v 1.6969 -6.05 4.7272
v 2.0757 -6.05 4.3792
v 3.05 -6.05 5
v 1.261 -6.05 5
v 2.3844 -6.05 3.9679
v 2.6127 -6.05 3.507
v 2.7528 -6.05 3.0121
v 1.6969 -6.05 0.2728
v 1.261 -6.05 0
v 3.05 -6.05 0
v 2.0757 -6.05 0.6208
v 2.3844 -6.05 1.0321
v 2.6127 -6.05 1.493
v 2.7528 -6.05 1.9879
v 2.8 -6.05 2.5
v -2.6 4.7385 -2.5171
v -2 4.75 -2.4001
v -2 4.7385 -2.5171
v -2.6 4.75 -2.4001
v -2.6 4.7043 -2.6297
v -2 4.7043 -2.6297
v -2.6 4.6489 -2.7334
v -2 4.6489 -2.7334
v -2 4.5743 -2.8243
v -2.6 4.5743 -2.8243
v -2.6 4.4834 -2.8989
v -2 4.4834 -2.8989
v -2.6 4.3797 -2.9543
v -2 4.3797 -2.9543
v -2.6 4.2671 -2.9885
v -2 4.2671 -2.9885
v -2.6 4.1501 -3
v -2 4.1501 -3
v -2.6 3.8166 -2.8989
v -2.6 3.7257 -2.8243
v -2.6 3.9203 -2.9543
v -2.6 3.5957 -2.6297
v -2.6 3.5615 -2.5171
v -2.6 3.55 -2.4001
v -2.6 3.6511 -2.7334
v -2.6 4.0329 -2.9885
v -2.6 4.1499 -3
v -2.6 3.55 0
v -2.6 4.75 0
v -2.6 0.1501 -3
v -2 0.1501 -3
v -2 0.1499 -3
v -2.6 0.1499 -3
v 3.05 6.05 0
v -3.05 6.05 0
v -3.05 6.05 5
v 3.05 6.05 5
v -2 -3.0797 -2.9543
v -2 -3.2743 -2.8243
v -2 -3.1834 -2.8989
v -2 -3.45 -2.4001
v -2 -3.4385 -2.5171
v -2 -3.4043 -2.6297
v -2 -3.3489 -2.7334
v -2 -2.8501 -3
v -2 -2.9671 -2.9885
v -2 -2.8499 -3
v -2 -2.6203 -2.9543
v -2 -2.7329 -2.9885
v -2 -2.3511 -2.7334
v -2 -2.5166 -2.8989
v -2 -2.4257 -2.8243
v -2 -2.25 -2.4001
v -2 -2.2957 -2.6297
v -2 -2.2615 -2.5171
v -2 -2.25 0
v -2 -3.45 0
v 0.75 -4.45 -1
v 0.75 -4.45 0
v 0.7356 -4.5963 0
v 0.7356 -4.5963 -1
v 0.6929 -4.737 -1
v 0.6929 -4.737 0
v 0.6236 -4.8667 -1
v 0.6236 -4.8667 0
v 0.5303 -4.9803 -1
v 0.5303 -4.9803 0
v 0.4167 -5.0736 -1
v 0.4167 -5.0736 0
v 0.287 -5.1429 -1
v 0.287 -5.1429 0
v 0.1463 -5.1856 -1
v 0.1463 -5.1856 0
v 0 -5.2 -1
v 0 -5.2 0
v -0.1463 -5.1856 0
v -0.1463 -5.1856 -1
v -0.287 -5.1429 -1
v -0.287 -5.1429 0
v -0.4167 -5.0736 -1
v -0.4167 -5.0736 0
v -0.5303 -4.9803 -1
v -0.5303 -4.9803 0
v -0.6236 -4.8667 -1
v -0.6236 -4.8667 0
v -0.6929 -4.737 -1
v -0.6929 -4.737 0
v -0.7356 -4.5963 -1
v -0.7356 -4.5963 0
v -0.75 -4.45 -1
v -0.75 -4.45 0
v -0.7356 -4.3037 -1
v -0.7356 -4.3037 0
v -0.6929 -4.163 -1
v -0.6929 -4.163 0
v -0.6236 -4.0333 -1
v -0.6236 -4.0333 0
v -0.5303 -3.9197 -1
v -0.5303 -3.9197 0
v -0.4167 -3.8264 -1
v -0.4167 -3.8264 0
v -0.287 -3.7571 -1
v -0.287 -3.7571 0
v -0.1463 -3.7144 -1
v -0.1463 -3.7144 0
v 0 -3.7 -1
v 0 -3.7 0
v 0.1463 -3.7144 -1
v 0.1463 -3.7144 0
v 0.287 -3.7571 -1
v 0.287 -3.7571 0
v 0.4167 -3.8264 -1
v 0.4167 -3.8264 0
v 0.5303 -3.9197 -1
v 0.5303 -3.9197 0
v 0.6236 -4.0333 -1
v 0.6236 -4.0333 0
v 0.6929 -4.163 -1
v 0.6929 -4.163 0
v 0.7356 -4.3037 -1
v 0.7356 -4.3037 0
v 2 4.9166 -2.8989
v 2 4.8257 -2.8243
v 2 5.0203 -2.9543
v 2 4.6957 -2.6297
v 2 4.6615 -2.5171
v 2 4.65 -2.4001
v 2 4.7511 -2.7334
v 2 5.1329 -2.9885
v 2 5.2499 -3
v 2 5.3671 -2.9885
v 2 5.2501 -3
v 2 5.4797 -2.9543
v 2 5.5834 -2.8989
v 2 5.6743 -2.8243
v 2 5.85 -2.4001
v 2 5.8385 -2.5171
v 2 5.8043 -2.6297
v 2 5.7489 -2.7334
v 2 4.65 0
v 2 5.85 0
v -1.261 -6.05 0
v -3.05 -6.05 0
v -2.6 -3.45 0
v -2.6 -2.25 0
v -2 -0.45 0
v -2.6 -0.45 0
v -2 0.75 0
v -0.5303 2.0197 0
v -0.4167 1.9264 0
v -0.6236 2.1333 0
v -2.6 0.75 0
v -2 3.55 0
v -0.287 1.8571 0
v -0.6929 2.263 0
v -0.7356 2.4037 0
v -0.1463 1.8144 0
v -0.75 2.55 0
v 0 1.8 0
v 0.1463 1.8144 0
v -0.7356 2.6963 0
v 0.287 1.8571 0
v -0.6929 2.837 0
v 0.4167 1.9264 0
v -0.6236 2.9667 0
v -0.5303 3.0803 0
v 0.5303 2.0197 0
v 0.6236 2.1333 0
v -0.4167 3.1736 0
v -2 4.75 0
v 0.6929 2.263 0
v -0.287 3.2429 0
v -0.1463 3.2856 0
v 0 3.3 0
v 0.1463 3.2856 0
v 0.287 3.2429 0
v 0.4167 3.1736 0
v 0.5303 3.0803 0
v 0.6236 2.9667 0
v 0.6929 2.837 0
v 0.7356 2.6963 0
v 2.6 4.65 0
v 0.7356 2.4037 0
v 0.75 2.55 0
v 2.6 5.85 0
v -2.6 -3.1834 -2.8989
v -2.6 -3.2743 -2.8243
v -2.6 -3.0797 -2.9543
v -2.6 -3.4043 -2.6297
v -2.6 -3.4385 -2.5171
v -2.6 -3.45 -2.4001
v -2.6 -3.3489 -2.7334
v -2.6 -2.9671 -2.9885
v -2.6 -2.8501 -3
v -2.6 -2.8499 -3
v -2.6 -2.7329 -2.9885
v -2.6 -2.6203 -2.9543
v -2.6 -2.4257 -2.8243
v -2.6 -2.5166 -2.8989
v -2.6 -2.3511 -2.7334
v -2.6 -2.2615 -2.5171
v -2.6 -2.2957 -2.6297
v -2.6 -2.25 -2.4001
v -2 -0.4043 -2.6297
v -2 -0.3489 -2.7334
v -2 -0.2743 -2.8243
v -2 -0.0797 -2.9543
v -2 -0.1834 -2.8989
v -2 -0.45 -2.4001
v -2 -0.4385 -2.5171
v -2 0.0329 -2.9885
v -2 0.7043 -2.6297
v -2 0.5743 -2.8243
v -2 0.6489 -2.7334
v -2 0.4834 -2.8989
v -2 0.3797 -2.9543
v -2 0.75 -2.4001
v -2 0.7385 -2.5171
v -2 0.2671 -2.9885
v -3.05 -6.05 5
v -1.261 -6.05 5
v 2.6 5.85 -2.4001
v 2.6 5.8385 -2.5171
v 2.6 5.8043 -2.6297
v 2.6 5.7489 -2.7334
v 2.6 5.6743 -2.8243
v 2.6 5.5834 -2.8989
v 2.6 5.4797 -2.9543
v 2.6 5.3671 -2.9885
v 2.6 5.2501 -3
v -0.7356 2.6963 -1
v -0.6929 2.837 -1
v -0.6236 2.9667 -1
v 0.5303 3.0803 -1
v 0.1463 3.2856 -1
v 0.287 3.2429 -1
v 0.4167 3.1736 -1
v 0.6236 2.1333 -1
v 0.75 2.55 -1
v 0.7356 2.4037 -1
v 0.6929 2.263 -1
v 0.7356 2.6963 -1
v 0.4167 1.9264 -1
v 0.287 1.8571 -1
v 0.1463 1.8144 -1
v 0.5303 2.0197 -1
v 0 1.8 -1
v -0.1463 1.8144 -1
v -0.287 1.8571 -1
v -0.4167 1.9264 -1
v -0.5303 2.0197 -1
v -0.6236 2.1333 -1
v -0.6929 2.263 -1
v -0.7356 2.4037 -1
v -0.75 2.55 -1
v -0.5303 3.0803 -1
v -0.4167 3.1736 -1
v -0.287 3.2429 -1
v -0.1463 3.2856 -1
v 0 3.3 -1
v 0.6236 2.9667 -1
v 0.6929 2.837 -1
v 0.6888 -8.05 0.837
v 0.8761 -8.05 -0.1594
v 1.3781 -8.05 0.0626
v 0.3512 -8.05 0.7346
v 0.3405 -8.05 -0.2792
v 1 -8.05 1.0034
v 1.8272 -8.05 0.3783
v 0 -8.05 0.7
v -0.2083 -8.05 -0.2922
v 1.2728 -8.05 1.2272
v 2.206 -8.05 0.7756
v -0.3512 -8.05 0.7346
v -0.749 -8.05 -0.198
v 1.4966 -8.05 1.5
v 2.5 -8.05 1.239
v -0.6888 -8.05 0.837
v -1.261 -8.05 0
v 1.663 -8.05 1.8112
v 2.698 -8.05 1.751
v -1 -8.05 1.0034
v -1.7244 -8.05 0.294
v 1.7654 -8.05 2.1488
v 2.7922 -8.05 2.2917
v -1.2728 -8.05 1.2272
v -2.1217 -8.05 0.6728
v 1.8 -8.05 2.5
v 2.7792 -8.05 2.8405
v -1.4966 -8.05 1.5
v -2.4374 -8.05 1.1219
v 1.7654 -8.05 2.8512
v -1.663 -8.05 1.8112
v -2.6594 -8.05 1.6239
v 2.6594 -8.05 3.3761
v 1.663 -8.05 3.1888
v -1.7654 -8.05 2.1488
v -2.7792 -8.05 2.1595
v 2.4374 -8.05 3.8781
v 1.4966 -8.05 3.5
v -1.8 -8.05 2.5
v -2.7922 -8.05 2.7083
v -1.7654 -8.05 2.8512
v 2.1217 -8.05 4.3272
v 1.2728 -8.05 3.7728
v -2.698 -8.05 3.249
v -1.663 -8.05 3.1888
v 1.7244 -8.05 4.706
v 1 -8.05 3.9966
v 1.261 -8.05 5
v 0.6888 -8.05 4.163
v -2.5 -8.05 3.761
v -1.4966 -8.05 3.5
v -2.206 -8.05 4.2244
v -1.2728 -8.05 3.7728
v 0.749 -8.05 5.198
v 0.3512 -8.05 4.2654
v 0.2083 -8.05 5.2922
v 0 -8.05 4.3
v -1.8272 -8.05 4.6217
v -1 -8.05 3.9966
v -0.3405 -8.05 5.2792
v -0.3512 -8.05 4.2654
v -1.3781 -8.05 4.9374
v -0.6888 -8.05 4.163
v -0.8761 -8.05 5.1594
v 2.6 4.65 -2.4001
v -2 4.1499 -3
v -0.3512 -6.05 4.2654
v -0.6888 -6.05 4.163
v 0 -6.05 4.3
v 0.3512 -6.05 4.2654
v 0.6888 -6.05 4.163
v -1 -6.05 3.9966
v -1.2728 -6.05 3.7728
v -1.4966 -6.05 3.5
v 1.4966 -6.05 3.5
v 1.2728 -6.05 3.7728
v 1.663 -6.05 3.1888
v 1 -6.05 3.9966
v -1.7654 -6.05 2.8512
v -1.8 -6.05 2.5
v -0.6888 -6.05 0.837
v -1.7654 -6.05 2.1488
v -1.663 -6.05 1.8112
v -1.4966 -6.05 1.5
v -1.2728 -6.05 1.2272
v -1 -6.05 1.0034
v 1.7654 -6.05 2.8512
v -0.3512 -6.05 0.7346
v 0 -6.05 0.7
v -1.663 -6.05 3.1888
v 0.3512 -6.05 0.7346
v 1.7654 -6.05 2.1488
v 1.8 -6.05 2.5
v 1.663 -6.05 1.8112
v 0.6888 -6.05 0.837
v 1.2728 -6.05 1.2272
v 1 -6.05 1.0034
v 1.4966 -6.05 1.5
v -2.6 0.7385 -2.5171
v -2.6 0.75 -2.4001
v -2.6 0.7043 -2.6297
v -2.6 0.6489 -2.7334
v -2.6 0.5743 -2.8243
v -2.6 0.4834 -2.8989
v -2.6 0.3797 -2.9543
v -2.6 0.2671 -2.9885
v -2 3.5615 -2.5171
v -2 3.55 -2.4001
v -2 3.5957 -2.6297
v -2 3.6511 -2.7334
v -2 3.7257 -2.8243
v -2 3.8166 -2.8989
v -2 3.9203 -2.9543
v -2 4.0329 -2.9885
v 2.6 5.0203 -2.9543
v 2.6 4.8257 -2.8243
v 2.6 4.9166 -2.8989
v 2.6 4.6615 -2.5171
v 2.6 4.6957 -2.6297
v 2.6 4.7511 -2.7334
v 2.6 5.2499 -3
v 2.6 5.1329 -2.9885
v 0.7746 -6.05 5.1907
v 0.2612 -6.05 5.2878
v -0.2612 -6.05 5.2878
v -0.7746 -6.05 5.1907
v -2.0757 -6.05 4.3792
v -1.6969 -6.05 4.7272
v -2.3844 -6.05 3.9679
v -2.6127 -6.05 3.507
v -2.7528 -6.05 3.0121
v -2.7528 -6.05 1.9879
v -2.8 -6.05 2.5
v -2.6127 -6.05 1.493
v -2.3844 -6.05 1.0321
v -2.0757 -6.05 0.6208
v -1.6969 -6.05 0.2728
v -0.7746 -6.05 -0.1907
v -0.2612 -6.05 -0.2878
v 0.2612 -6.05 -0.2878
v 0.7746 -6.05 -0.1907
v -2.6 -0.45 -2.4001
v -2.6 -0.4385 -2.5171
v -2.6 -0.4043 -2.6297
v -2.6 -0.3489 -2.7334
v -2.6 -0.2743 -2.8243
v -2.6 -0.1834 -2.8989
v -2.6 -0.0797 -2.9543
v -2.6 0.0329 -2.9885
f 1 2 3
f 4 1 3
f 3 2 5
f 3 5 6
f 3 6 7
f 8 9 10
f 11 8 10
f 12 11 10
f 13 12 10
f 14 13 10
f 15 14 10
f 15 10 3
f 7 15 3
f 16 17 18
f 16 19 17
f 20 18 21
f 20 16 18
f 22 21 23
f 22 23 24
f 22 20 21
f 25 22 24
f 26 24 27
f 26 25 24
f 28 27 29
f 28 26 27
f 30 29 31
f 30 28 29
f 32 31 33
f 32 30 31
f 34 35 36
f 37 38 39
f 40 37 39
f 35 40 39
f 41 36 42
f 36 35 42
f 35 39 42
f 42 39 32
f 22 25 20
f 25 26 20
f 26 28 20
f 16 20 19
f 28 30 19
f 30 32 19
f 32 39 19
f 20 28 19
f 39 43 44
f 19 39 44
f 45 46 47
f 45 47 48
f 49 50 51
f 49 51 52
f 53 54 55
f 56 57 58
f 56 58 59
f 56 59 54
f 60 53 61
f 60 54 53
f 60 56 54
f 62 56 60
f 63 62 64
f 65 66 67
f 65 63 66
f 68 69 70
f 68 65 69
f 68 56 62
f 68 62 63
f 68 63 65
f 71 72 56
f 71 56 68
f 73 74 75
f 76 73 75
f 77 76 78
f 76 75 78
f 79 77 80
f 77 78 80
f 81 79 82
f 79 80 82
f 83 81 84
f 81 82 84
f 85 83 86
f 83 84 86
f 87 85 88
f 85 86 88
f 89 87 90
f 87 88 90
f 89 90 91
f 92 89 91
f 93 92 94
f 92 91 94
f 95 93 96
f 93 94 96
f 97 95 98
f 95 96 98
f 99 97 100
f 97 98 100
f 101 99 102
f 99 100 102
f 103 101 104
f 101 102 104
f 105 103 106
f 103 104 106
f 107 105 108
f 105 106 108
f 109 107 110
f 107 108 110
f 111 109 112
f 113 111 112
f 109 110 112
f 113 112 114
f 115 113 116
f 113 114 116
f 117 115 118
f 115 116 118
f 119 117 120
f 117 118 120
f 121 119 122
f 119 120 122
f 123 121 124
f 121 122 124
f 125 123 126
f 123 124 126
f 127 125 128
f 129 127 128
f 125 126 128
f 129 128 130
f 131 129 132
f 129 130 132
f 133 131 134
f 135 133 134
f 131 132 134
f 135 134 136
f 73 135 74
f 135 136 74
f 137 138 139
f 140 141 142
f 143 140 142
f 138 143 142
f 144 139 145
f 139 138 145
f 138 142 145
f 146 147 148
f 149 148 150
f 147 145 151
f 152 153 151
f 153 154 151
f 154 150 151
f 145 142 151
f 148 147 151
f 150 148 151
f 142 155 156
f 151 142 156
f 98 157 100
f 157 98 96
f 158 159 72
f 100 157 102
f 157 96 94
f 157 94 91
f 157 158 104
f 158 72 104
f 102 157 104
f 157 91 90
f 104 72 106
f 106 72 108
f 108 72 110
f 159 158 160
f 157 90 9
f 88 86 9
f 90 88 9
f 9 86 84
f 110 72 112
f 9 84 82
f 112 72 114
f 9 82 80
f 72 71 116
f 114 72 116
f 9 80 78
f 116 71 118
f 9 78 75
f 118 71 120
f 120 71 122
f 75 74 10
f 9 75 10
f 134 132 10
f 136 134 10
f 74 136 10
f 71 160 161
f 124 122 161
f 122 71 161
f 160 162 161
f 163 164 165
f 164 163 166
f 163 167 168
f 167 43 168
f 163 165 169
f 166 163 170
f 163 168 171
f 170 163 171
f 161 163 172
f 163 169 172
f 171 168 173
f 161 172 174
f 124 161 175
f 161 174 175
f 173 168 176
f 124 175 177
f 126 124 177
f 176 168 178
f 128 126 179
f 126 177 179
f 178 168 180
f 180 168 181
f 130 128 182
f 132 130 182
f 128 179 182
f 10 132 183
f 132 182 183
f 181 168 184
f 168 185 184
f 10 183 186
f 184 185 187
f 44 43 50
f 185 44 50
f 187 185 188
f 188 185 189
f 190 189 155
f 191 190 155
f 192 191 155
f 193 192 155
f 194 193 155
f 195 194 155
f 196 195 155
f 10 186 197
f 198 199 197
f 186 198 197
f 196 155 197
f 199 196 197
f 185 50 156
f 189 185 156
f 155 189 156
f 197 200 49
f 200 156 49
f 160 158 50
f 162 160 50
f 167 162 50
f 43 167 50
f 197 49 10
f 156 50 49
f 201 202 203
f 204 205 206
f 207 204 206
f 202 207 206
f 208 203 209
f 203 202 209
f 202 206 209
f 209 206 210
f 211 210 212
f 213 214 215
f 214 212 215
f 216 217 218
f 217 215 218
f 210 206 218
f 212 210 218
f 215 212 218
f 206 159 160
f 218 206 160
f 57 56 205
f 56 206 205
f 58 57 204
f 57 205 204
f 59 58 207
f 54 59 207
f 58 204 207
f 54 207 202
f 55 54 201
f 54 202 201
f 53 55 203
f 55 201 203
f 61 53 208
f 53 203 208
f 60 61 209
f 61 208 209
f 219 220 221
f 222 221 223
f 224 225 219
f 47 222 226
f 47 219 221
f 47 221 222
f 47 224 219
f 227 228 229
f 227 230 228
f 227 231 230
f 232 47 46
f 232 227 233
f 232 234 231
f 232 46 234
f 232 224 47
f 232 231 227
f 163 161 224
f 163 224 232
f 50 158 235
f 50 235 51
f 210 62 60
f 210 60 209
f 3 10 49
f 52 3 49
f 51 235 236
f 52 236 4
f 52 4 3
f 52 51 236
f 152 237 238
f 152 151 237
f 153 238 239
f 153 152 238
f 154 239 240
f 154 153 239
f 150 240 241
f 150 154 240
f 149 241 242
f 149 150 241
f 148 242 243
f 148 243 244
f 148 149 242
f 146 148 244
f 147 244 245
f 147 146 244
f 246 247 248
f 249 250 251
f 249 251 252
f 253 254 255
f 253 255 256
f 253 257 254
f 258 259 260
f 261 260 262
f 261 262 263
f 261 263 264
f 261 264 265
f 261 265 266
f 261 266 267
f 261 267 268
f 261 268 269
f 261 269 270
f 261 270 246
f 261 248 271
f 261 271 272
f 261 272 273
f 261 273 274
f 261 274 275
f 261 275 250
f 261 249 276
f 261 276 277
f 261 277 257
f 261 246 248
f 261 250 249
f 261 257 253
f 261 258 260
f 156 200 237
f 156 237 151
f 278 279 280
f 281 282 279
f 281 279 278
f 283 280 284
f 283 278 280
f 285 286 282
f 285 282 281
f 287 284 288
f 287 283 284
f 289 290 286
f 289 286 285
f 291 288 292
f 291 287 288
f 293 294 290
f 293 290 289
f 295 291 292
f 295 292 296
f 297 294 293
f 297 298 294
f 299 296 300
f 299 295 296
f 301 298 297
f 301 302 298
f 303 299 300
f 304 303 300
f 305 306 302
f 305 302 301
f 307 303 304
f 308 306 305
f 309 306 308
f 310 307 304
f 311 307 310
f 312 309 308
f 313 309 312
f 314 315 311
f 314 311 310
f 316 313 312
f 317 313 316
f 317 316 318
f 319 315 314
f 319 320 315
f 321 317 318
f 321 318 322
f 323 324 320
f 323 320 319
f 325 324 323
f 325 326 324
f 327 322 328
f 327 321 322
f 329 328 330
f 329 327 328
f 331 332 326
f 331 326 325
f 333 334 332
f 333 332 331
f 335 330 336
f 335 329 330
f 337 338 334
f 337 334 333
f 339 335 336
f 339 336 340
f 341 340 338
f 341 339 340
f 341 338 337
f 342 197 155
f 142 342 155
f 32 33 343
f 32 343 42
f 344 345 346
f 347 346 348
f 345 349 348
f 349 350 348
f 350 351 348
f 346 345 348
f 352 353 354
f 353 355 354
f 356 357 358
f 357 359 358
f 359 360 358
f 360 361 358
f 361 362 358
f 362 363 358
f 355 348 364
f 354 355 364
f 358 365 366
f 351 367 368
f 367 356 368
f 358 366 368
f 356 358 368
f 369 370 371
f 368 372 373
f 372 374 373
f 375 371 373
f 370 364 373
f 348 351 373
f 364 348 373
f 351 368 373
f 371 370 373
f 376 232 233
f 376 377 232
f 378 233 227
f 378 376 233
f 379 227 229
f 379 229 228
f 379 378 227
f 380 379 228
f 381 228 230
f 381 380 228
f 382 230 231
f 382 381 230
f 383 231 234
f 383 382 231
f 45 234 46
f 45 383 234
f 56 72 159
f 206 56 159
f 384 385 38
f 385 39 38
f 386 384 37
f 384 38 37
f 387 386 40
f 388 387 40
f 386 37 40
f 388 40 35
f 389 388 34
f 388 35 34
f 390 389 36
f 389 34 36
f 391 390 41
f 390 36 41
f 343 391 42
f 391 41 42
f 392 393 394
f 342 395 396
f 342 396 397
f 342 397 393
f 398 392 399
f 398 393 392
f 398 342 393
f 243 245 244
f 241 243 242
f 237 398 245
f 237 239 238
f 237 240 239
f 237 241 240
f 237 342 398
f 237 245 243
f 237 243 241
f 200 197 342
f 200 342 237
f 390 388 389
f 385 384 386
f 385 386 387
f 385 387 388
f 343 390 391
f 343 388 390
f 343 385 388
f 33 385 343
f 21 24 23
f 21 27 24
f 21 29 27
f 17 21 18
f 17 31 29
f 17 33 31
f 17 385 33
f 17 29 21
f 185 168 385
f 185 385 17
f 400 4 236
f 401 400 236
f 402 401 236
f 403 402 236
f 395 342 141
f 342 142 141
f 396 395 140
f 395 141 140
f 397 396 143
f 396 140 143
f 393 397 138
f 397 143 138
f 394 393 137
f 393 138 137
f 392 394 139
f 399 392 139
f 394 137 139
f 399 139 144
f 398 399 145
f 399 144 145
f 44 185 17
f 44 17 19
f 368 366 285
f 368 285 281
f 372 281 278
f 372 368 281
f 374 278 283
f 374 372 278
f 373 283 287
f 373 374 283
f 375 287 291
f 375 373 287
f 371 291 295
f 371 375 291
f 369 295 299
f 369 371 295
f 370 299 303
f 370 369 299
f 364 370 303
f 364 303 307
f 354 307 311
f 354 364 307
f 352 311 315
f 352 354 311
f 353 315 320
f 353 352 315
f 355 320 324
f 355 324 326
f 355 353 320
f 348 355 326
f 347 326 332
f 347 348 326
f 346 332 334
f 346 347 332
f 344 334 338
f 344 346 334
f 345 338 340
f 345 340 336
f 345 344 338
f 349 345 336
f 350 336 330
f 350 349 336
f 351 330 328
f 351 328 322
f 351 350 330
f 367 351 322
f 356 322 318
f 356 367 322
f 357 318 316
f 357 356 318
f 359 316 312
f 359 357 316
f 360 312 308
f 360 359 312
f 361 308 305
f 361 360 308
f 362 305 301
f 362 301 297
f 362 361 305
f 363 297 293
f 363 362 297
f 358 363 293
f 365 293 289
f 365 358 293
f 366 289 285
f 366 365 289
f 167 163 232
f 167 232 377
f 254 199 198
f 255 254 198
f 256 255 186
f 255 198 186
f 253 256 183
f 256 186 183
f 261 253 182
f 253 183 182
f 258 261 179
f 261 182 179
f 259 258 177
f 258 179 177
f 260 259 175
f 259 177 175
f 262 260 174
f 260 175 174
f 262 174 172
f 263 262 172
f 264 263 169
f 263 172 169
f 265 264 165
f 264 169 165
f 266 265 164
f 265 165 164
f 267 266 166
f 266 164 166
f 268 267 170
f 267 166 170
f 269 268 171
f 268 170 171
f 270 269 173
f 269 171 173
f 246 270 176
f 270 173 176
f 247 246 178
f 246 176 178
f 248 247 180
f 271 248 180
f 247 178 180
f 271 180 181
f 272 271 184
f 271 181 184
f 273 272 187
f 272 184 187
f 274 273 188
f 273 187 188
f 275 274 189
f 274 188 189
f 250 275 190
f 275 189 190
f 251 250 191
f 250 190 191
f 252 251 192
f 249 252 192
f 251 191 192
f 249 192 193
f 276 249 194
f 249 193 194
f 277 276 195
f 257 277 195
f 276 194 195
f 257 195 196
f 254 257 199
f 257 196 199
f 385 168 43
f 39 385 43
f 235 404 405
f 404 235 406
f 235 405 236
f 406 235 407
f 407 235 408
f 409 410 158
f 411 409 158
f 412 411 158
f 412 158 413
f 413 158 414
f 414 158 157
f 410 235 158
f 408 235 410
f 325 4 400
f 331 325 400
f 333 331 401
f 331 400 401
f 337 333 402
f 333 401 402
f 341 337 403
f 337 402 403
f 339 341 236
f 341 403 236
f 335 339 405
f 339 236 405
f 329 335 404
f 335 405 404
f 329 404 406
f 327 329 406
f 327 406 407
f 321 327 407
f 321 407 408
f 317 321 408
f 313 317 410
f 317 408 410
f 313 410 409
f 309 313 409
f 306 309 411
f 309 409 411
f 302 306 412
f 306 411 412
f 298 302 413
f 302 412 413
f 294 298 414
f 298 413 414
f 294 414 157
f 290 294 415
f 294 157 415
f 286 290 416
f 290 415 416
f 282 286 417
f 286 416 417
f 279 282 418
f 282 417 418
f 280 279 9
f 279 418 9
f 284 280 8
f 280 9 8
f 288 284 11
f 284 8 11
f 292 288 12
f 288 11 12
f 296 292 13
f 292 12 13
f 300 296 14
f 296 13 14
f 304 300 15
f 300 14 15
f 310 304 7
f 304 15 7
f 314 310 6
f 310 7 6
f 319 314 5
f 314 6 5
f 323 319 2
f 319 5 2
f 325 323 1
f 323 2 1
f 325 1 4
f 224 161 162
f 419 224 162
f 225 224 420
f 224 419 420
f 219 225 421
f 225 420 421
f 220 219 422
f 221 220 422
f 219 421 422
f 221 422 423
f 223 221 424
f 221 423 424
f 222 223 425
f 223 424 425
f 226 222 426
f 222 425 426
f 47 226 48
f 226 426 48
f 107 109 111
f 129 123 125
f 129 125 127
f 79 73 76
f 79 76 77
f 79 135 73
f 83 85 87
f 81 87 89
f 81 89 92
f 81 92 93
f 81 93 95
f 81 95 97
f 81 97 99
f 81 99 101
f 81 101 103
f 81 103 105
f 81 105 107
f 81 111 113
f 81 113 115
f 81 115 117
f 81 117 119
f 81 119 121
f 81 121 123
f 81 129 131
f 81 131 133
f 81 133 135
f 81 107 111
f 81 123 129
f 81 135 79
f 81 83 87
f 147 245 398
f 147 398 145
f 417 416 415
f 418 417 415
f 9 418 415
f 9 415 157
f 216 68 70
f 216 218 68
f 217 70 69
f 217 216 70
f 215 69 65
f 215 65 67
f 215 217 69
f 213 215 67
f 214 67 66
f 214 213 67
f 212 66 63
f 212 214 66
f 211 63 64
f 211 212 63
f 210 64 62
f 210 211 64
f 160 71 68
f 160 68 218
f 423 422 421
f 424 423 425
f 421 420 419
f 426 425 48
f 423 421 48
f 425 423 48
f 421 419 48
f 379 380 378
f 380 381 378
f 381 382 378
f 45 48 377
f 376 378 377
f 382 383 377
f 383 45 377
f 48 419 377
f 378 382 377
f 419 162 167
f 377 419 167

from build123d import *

# Parameters (mm, degrees)
SKETCH1_W           = 6.1
SKETCH1_H           = 12.1
BOSS_EXTRUDE1_DEPTH = 5
SKETCH2_R           = 2.8
SKETCH2_R_2         = 1.8
BOSS_EXTRUDE2_DEPTH = 2
SKETCH3_R           = 0.75
BOSS_EXTRUDE3_DEPTH = 1
SKETCH4_W           = 0.6
SKETCH4_H           = 1.2
BOSS_EXTRUDE4_DEPTH = 3
FILLET1_R           = 0.6


with BuildPart() as part:
    # Sketch1 → Boss-Extrude1 (new body)
    with BuildSketch(Plane.XY):
        Rectangle(SKETCH1_W, SKETCH1_H)
    extrude(amount=BOSS_EXTRUDE1_DEPTH)

    # Sketch2 → Boss-Extrude2 (add)
    with BuildSketch(Plane.XZ.offset(6.05)):
        with Locations(Location((0, 2.5, 0), (0, 0, 63.234499423))):
            Circle(SKETCH2_R)
        with Locations(Location((0, 2.5, 0), (0, 0, 270))):
            Circle(SKETCH2_R_2, mode=Mode.SUBTRACT)
    extrude(amount=BOSS_EXTRUDE2_DEPTH)

    # Sketch3 → Boss-Extrude3 (add)
    with BuildSketch(Plane(origin=(0, 0, 0), x_dir=(-1, 0, 0), z_dir=(0, 0, -1))):
        with Locations(Location((0, -4.45, 0), (0, 0, 180))):
            Circle(SKETCH3_R)
        with Locations(Location((0, 2.55, 0), (0, 0, 180))):
            Circle(SKETCH3_R)
    extrude(amount=BOSS_EXTRUDE3_DEPTH)

    # Sketch4 → Boss-Extrude4 (add)
    with BuildSketch(Plane(origin=(0, 0, 0), x_dir=(-1, 0, 0), z_dir=(0, 0, -1))):
        with Locations((2.3, -2.85)):
            Rectangle(SKETCH4_W, SKETCH4_H)
        with Locations((2.3, 0.15)):
            Rectangle(SKETCH4_W, SKETCH4_H)
        with Locations((2.3, 4.15)):
            Rectangle(SKETCH4_W, SKETCH4_H)
        with Locations((-2.3, 5.25)):
            Rectangle(SKETCH4_W, SKETCH4_H)
    extrude(amount=BOSS_EXTRUDE4_DEPTH)

    # Fillet1
    fillet1_edges = [part.edges().sort_by_distance(p)[0] for p in [
        (-2.3, 4.75, -3),
        (2.3, 5.85, -3),
        (2.3, 4.65, -3),
        (-2.3, 3.55, -3),
        (-2.3, 0.75, -3),
        (-2.3, -0.45, -3),
        (-2.3, -2.25, -3),
        (-2.3, -3.45, -3),
    ]]
    fillet(fillet1_edges, radius=FILLET1_R - 0.0001)  # a hair under: the kernel refuses the full size


solid = part.part
